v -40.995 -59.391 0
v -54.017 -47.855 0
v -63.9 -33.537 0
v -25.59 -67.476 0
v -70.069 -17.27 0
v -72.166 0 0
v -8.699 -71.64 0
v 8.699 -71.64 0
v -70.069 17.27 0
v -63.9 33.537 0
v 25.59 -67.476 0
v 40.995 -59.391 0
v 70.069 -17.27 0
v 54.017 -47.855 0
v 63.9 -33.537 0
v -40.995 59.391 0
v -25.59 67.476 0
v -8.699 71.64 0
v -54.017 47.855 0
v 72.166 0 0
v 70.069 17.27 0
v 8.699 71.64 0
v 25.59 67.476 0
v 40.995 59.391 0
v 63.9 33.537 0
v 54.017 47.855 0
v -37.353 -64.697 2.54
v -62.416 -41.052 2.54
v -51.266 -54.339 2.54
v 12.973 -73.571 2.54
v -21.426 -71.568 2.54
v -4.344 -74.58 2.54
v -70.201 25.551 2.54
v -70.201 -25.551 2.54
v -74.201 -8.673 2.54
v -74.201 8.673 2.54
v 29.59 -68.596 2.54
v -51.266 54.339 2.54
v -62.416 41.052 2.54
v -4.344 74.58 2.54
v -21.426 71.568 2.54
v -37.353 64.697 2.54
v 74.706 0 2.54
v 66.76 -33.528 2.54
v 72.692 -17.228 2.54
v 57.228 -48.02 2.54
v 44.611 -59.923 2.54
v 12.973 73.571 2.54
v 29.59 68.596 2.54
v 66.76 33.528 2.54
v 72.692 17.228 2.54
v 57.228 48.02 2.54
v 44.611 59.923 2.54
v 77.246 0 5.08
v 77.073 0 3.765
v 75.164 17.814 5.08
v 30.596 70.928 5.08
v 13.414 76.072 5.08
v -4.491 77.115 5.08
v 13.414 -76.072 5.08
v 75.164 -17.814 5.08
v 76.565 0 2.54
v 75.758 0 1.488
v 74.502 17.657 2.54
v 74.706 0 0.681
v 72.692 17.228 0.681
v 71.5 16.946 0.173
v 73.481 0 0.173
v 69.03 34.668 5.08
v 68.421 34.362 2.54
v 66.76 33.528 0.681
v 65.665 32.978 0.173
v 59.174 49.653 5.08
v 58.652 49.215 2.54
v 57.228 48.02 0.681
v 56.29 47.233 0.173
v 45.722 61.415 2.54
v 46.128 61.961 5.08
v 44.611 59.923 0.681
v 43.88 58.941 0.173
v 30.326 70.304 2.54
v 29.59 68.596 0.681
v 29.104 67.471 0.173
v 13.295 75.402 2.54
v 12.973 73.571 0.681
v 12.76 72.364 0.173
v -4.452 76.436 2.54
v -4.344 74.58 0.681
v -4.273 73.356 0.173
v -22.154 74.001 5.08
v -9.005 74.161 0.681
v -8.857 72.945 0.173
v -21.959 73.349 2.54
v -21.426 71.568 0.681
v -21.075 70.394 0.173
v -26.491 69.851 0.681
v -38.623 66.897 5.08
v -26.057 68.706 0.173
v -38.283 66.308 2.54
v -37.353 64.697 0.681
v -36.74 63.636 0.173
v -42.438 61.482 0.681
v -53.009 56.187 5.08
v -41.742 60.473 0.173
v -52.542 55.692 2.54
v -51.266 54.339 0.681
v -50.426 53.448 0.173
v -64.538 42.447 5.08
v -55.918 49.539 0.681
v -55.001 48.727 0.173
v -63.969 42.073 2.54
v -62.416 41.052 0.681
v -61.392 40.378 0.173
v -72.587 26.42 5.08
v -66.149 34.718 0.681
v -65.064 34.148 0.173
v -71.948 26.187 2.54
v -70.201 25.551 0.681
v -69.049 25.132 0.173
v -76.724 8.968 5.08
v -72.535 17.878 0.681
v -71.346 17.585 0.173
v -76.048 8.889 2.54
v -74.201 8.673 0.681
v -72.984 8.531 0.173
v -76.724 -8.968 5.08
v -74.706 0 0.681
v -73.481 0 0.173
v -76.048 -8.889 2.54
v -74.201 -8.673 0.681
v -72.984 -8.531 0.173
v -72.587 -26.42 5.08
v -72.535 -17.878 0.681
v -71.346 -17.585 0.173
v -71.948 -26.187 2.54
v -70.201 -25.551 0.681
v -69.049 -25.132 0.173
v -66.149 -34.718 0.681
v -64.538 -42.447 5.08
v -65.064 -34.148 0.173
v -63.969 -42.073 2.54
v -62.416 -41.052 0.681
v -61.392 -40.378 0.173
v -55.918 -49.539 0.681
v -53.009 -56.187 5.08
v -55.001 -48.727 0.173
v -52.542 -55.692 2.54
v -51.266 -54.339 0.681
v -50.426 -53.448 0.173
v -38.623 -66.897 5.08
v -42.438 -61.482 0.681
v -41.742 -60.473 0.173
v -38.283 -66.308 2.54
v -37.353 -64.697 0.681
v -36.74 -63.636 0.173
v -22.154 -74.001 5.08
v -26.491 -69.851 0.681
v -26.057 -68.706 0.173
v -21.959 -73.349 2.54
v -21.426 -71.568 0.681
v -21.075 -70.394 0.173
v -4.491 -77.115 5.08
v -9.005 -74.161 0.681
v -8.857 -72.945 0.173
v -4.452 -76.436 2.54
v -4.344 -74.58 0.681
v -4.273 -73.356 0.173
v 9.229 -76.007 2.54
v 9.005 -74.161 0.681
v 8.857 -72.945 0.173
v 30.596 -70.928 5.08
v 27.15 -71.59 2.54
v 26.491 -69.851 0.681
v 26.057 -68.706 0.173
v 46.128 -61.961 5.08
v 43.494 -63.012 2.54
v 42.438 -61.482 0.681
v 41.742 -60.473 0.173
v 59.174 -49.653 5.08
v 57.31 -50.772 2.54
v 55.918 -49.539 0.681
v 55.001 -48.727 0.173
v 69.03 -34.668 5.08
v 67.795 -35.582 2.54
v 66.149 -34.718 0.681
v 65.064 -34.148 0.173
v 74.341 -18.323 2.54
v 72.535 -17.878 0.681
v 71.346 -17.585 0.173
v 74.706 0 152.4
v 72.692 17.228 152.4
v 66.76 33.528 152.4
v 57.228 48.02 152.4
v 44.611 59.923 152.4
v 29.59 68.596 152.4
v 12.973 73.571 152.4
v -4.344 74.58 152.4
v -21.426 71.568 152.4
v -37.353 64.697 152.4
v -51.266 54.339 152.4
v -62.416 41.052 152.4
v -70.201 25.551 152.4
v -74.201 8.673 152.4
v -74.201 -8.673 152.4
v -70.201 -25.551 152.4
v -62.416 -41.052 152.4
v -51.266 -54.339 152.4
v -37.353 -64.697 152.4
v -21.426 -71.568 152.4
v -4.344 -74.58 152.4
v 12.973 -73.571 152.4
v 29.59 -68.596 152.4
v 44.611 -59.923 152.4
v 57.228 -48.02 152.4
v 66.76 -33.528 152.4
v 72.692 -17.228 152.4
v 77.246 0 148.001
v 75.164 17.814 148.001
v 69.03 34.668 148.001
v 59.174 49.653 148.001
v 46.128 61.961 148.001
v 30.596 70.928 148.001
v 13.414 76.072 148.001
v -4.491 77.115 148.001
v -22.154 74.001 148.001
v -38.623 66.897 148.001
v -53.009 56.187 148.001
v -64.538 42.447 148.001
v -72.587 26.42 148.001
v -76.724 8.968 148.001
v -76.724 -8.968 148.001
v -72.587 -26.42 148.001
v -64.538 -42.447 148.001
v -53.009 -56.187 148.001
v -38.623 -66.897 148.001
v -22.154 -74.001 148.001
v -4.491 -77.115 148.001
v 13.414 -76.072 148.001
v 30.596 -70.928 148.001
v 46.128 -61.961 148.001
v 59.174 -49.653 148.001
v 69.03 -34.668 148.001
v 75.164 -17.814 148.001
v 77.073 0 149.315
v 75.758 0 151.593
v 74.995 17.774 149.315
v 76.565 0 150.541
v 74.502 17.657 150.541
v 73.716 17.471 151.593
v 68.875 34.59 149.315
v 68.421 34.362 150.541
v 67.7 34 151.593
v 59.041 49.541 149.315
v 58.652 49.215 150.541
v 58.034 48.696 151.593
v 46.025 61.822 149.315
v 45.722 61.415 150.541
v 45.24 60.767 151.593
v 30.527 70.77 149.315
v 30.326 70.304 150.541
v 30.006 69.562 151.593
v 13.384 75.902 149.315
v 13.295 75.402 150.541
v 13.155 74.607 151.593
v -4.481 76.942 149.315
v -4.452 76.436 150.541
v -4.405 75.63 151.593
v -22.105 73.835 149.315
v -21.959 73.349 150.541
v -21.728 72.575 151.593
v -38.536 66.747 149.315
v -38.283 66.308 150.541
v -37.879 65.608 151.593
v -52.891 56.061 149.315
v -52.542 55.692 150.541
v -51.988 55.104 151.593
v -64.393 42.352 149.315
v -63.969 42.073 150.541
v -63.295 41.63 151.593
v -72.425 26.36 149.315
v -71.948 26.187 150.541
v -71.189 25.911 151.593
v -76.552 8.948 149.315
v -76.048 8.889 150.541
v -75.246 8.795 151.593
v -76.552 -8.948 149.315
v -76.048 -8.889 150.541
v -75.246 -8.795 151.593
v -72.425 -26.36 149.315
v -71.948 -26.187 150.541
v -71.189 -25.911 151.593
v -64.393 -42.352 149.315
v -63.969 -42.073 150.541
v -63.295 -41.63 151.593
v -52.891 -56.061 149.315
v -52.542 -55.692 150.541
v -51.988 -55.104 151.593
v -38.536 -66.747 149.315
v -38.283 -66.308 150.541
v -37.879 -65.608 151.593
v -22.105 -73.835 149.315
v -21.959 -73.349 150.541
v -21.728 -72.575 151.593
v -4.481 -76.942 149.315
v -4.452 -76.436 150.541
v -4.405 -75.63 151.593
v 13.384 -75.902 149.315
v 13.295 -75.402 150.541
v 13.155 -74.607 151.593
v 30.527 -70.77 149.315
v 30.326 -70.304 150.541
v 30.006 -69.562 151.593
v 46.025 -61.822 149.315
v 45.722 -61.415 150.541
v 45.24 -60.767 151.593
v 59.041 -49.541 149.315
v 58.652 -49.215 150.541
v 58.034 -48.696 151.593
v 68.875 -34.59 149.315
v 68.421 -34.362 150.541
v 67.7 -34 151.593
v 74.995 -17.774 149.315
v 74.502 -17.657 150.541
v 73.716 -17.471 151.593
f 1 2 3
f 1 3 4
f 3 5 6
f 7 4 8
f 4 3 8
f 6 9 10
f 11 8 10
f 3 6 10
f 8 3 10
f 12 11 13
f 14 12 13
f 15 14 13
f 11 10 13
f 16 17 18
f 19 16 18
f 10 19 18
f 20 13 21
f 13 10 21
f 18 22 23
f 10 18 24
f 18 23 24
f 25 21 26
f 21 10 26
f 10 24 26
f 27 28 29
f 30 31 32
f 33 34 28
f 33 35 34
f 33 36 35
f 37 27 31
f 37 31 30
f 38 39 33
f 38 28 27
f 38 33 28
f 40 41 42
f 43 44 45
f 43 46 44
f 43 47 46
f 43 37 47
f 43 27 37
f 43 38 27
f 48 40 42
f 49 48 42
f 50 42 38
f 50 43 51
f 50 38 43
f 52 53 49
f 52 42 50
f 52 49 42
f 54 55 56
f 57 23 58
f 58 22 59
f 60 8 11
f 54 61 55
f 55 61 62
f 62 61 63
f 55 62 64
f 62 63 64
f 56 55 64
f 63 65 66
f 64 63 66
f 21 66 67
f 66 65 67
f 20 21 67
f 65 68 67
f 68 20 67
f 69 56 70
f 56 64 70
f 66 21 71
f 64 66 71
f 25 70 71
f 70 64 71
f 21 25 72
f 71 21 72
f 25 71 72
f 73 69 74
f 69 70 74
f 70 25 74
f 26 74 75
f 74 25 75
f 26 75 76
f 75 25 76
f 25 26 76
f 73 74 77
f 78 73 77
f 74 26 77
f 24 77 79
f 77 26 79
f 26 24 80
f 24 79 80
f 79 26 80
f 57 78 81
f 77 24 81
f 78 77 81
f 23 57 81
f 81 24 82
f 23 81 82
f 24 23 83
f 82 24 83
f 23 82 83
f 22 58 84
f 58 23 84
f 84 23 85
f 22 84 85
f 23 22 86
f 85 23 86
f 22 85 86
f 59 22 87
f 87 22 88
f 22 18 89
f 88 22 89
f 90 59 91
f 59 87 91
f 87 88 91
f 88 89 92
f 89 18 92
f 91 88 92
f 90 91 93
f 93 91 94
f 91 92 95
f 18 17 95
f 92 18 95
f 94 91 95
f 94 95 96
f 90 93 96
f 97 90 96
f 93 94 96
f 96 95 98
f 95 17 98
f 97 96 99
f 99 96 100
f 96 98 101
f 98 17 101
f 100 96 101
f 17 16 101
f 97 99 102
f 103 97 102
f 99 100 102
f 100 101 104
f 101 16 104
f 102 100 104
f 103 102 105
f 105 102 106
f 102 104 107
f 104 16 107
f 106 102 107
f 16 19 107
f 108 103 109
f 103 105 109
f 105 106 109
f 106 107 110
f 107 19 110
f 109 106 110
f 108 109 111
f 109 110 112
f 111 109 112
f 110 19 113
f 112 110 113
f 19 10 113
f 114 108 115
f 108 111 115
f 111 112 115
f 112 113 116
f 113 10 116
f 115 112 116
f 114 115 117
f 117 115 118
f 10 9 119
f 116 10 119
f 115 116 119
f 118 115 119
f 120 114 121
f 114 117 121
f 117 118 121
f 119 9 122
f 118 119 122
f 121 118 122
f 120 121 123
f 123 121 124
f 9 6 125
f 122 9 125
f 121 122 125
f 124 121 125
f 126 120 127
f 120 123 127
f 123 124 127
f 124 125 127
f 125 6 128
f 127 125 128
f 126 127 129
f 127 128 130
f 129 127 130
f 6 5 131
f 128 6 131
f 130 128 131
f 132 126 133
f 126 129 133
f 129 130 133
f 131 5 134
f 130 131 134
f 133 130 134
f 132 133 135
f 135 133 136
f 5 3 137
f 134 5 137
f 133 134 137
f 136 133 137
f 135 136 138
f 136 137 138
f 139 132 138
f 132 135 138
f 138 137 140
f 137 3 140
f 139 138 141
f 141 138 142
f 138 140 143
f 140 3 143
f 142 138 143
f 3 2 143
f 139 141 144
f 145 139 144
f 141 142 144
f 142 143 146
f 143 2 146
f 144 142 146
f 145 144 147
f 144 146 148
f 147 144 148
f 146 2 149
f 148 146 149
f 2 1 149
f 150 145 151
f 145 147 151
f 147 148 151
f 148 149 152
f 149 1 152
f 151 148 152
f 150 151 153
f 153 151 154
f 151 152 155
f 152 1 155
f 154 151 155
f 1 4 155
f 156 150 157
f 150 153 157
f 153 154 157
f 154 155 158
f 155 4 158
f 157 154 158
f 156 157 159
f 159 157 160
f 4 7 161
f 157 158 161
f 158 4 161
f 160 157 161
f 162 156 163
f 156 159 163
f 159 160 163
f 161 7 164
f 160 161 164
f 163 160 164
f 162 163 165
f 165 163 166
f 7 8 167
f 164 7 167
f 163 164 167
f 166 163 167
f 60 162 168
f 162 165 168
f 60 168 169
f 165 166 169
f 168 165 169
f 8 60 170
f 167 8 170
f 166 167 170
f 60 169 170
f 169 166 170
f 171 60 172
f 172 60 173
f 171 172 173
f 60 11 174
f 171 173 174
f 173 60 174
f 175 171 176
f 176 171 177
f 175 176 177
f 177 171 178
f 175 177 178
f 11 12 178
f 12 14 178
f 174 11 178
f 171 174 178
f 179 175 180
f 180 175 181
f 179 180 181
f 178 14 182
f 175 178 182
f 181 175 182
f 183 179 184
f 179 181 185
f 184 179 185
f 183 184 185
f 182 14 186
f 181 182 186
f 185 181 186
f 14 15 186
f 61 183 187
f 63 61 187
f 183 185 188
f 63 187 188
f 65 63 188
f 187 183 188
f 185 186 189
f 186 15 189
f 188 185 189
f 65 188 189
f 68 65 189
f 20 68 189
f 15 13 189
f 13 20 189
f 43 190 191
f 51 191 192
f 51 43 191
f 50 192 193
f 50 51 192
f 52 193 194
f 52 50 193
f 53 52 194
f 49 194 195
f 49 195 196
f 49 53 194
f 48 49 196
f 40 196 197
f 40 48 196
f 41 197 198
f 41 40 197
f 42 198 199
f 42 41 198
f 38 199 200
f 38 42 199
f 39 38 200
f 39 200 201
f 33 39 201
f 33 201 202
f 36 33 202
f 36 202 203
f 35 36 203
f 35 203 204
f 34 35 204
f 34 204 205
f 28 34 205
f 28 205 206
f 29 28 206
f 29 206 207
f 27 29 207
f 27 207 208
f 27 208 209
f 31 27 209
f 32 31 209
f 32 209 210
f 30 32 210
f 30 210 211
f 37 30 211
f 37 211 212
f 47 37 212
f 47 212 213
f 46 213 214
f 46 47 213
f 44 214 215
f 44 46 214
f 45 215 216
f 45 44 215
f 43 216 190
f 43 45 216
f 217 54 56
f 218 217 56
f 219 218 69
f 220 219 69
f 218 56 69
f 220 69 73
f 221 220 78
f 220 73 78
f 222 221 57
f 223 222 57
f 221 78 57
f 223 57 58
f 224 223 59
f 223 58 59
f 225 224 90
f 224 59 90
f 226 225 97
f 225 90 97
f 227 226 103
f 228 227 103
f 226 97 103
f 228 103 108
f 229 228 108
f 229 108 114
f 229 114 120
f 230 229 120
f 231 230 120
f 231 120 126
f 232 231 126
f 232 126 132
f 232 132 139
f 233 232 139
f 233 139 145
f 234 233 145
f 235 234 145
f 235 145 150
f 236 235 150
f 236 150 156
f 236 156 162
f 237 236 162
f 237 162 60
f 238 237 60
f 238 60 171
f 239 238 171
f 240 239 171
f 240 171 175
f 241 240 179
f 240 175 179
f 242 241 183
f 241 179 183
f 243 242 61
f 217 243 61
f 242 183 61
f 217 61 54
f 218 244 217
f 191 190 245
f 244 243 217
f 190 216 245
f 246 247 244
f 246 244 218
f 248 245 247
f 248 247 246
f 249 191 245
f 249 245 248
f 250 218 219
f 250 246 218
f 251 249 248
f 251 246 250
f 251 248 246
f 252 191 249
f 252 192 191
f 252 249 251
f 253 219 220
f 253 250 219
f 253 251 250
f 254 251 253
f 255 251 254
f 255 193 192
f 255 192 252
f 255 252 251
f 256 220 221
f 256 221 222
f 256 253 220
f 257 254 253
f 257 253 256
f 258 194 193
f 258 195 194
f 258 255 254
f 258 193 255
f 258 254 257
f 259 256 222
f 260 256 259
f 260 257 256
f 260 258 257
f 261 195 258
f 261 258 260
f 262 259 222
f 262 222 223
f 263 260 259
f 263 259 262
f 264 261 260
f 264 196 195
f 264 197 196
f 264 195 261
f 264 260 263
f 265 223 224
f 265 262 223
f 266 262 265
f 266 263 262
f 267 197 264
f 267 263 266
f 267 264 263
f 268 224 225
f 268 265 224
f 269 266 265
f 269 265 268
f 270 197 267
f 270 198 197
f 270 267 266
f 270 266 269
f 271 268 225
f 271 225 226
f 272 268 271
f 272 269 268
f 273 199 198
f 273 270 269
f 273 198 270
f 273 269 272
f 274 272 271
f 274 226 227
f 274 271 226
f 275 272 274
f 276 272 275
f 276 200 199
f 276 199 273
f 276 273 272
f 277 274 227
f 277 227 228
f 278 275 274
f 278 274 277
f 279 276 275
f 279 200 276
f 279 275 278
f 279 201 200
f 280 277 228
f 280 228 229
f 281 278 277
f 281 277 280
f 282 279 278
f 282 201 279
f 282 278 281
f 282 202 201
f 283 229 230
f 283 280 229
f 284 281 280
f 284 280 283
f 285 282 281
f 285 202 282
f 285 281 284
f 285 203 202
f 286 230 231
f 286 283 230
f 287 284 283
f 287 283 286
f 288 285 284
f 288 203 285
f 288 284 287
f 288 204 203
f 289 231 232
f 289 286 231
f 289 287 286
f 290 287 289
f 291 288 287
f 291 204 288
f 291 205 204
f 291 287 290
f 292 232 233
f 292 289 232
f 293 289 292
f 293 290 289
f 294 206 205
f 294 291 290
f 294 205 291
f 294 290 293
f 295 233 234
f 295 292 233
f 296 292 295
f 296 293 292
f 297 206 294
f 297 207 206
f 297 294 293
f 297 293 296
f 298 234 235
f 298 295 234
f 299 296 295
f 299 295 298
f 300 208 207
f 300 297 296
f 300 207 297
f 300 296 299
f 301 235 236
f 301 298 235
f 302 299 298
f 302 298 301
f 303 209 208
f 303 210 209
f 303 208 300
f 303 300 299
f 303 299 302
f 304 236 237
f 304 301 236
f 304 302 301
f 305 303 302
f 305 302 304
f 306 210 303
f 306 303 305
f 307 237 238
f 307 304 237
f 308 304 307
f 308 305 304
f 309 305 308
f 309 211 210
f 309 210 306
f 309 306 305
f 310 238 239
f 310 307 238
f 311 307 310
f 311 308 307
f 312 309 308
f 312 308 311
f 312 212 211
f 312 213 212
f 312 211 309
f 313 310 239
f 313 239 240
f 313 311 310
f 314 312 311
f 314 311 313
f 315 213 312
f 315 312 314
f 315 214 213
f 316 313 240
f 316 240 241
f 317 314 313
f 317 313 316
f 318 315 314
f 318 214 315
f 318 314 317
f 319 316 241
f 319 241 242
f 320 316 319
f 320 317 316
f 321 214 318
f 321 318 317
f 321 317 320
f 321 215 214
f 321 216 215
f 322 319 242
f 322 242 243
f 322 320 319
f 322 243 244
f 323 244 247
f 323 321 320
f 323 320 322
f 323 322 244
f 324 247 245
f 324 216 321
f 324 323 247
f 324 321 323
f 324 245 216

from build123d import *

# Parameters (mm, degrees)
F0_R     = 77.2459494585
F1_DEPTH = 152.4
F2_T     = -2.54


# Not quite as in the source:
# - a fillet or chamfer that OpenCascade refuses, or shapes differently, is made with other operations: its cross-section is extruded or revolved along the edge and cut away or added


with BuildPart() as f1:
    # F0 (on Top) → F1 (new body)
    with BuildSketch(Plane.XY):
        Circle(F0_R)
    extrude(amount=F1_DEPTH)

    # F2
    f2_openings = [f1.faces().sort_by_distance(p)[0] for p in [
        (0, 0, 152.4),
    ]]
    offset(amount=F2_T, openings=f2_openings)

    # F3: fillet of radius 5.08 on 3 edges, made by hand

    # F3_s1 → F3_t2 (revolve, cut)
    with BuildSketch(Plane.XZ):
        with BuildLine():
            ThreePointArc((77.2459494585, 5.08), (75.758051907, 1.4878975516), (72.1659494585, 0))
            Line((72.1659494585, 0), (72.1659494585, -0.1016))
            Line((72.1659494585, -0.1016), (77.3475494585, -0.1016))
            Line((77.3475494585, -0.1016), (77.3475494585, 5.08))
            Line((77.3475494585, 5.08), (77.2459494585, 5.08))
        make_face()
    revolve(axis=Axis((0, 0, 0), (0, 0, 1)), mode=Mode.SUBTRACT)

    # F3_s3 → F3_t4 (revolve, cut)
    with BuildSketch(Plane.XZ):
        with BuildLine():
            ThreePointArc((77.2459494585, 148.0005909488), (76.5653585098, 150.5405909488), (74.7059494585, 152.4))
            Line((74.7059494585, 152.4), (74.7567494585, 152.487988181))
            ThreePointArc((74.7567494585, 152.487988181), (75.9759494585, 152.5016), (77.2459494585, 152.5016))
            Line((77.2459494585, 152.5016), (77.3475494585, 152.4))
            Line((77.3475494585, 152.4), (77.3475494585, 148.0005909488))
            Line((77.3475494585, 148.0005909488), (77.2459494585, 148.0005909488))
        make_face()
    revolve(axis=Axis((0, 0, 152.4), (0, 0, 1)), mode=Mode.SUBTRACT)


solid = f1.part
